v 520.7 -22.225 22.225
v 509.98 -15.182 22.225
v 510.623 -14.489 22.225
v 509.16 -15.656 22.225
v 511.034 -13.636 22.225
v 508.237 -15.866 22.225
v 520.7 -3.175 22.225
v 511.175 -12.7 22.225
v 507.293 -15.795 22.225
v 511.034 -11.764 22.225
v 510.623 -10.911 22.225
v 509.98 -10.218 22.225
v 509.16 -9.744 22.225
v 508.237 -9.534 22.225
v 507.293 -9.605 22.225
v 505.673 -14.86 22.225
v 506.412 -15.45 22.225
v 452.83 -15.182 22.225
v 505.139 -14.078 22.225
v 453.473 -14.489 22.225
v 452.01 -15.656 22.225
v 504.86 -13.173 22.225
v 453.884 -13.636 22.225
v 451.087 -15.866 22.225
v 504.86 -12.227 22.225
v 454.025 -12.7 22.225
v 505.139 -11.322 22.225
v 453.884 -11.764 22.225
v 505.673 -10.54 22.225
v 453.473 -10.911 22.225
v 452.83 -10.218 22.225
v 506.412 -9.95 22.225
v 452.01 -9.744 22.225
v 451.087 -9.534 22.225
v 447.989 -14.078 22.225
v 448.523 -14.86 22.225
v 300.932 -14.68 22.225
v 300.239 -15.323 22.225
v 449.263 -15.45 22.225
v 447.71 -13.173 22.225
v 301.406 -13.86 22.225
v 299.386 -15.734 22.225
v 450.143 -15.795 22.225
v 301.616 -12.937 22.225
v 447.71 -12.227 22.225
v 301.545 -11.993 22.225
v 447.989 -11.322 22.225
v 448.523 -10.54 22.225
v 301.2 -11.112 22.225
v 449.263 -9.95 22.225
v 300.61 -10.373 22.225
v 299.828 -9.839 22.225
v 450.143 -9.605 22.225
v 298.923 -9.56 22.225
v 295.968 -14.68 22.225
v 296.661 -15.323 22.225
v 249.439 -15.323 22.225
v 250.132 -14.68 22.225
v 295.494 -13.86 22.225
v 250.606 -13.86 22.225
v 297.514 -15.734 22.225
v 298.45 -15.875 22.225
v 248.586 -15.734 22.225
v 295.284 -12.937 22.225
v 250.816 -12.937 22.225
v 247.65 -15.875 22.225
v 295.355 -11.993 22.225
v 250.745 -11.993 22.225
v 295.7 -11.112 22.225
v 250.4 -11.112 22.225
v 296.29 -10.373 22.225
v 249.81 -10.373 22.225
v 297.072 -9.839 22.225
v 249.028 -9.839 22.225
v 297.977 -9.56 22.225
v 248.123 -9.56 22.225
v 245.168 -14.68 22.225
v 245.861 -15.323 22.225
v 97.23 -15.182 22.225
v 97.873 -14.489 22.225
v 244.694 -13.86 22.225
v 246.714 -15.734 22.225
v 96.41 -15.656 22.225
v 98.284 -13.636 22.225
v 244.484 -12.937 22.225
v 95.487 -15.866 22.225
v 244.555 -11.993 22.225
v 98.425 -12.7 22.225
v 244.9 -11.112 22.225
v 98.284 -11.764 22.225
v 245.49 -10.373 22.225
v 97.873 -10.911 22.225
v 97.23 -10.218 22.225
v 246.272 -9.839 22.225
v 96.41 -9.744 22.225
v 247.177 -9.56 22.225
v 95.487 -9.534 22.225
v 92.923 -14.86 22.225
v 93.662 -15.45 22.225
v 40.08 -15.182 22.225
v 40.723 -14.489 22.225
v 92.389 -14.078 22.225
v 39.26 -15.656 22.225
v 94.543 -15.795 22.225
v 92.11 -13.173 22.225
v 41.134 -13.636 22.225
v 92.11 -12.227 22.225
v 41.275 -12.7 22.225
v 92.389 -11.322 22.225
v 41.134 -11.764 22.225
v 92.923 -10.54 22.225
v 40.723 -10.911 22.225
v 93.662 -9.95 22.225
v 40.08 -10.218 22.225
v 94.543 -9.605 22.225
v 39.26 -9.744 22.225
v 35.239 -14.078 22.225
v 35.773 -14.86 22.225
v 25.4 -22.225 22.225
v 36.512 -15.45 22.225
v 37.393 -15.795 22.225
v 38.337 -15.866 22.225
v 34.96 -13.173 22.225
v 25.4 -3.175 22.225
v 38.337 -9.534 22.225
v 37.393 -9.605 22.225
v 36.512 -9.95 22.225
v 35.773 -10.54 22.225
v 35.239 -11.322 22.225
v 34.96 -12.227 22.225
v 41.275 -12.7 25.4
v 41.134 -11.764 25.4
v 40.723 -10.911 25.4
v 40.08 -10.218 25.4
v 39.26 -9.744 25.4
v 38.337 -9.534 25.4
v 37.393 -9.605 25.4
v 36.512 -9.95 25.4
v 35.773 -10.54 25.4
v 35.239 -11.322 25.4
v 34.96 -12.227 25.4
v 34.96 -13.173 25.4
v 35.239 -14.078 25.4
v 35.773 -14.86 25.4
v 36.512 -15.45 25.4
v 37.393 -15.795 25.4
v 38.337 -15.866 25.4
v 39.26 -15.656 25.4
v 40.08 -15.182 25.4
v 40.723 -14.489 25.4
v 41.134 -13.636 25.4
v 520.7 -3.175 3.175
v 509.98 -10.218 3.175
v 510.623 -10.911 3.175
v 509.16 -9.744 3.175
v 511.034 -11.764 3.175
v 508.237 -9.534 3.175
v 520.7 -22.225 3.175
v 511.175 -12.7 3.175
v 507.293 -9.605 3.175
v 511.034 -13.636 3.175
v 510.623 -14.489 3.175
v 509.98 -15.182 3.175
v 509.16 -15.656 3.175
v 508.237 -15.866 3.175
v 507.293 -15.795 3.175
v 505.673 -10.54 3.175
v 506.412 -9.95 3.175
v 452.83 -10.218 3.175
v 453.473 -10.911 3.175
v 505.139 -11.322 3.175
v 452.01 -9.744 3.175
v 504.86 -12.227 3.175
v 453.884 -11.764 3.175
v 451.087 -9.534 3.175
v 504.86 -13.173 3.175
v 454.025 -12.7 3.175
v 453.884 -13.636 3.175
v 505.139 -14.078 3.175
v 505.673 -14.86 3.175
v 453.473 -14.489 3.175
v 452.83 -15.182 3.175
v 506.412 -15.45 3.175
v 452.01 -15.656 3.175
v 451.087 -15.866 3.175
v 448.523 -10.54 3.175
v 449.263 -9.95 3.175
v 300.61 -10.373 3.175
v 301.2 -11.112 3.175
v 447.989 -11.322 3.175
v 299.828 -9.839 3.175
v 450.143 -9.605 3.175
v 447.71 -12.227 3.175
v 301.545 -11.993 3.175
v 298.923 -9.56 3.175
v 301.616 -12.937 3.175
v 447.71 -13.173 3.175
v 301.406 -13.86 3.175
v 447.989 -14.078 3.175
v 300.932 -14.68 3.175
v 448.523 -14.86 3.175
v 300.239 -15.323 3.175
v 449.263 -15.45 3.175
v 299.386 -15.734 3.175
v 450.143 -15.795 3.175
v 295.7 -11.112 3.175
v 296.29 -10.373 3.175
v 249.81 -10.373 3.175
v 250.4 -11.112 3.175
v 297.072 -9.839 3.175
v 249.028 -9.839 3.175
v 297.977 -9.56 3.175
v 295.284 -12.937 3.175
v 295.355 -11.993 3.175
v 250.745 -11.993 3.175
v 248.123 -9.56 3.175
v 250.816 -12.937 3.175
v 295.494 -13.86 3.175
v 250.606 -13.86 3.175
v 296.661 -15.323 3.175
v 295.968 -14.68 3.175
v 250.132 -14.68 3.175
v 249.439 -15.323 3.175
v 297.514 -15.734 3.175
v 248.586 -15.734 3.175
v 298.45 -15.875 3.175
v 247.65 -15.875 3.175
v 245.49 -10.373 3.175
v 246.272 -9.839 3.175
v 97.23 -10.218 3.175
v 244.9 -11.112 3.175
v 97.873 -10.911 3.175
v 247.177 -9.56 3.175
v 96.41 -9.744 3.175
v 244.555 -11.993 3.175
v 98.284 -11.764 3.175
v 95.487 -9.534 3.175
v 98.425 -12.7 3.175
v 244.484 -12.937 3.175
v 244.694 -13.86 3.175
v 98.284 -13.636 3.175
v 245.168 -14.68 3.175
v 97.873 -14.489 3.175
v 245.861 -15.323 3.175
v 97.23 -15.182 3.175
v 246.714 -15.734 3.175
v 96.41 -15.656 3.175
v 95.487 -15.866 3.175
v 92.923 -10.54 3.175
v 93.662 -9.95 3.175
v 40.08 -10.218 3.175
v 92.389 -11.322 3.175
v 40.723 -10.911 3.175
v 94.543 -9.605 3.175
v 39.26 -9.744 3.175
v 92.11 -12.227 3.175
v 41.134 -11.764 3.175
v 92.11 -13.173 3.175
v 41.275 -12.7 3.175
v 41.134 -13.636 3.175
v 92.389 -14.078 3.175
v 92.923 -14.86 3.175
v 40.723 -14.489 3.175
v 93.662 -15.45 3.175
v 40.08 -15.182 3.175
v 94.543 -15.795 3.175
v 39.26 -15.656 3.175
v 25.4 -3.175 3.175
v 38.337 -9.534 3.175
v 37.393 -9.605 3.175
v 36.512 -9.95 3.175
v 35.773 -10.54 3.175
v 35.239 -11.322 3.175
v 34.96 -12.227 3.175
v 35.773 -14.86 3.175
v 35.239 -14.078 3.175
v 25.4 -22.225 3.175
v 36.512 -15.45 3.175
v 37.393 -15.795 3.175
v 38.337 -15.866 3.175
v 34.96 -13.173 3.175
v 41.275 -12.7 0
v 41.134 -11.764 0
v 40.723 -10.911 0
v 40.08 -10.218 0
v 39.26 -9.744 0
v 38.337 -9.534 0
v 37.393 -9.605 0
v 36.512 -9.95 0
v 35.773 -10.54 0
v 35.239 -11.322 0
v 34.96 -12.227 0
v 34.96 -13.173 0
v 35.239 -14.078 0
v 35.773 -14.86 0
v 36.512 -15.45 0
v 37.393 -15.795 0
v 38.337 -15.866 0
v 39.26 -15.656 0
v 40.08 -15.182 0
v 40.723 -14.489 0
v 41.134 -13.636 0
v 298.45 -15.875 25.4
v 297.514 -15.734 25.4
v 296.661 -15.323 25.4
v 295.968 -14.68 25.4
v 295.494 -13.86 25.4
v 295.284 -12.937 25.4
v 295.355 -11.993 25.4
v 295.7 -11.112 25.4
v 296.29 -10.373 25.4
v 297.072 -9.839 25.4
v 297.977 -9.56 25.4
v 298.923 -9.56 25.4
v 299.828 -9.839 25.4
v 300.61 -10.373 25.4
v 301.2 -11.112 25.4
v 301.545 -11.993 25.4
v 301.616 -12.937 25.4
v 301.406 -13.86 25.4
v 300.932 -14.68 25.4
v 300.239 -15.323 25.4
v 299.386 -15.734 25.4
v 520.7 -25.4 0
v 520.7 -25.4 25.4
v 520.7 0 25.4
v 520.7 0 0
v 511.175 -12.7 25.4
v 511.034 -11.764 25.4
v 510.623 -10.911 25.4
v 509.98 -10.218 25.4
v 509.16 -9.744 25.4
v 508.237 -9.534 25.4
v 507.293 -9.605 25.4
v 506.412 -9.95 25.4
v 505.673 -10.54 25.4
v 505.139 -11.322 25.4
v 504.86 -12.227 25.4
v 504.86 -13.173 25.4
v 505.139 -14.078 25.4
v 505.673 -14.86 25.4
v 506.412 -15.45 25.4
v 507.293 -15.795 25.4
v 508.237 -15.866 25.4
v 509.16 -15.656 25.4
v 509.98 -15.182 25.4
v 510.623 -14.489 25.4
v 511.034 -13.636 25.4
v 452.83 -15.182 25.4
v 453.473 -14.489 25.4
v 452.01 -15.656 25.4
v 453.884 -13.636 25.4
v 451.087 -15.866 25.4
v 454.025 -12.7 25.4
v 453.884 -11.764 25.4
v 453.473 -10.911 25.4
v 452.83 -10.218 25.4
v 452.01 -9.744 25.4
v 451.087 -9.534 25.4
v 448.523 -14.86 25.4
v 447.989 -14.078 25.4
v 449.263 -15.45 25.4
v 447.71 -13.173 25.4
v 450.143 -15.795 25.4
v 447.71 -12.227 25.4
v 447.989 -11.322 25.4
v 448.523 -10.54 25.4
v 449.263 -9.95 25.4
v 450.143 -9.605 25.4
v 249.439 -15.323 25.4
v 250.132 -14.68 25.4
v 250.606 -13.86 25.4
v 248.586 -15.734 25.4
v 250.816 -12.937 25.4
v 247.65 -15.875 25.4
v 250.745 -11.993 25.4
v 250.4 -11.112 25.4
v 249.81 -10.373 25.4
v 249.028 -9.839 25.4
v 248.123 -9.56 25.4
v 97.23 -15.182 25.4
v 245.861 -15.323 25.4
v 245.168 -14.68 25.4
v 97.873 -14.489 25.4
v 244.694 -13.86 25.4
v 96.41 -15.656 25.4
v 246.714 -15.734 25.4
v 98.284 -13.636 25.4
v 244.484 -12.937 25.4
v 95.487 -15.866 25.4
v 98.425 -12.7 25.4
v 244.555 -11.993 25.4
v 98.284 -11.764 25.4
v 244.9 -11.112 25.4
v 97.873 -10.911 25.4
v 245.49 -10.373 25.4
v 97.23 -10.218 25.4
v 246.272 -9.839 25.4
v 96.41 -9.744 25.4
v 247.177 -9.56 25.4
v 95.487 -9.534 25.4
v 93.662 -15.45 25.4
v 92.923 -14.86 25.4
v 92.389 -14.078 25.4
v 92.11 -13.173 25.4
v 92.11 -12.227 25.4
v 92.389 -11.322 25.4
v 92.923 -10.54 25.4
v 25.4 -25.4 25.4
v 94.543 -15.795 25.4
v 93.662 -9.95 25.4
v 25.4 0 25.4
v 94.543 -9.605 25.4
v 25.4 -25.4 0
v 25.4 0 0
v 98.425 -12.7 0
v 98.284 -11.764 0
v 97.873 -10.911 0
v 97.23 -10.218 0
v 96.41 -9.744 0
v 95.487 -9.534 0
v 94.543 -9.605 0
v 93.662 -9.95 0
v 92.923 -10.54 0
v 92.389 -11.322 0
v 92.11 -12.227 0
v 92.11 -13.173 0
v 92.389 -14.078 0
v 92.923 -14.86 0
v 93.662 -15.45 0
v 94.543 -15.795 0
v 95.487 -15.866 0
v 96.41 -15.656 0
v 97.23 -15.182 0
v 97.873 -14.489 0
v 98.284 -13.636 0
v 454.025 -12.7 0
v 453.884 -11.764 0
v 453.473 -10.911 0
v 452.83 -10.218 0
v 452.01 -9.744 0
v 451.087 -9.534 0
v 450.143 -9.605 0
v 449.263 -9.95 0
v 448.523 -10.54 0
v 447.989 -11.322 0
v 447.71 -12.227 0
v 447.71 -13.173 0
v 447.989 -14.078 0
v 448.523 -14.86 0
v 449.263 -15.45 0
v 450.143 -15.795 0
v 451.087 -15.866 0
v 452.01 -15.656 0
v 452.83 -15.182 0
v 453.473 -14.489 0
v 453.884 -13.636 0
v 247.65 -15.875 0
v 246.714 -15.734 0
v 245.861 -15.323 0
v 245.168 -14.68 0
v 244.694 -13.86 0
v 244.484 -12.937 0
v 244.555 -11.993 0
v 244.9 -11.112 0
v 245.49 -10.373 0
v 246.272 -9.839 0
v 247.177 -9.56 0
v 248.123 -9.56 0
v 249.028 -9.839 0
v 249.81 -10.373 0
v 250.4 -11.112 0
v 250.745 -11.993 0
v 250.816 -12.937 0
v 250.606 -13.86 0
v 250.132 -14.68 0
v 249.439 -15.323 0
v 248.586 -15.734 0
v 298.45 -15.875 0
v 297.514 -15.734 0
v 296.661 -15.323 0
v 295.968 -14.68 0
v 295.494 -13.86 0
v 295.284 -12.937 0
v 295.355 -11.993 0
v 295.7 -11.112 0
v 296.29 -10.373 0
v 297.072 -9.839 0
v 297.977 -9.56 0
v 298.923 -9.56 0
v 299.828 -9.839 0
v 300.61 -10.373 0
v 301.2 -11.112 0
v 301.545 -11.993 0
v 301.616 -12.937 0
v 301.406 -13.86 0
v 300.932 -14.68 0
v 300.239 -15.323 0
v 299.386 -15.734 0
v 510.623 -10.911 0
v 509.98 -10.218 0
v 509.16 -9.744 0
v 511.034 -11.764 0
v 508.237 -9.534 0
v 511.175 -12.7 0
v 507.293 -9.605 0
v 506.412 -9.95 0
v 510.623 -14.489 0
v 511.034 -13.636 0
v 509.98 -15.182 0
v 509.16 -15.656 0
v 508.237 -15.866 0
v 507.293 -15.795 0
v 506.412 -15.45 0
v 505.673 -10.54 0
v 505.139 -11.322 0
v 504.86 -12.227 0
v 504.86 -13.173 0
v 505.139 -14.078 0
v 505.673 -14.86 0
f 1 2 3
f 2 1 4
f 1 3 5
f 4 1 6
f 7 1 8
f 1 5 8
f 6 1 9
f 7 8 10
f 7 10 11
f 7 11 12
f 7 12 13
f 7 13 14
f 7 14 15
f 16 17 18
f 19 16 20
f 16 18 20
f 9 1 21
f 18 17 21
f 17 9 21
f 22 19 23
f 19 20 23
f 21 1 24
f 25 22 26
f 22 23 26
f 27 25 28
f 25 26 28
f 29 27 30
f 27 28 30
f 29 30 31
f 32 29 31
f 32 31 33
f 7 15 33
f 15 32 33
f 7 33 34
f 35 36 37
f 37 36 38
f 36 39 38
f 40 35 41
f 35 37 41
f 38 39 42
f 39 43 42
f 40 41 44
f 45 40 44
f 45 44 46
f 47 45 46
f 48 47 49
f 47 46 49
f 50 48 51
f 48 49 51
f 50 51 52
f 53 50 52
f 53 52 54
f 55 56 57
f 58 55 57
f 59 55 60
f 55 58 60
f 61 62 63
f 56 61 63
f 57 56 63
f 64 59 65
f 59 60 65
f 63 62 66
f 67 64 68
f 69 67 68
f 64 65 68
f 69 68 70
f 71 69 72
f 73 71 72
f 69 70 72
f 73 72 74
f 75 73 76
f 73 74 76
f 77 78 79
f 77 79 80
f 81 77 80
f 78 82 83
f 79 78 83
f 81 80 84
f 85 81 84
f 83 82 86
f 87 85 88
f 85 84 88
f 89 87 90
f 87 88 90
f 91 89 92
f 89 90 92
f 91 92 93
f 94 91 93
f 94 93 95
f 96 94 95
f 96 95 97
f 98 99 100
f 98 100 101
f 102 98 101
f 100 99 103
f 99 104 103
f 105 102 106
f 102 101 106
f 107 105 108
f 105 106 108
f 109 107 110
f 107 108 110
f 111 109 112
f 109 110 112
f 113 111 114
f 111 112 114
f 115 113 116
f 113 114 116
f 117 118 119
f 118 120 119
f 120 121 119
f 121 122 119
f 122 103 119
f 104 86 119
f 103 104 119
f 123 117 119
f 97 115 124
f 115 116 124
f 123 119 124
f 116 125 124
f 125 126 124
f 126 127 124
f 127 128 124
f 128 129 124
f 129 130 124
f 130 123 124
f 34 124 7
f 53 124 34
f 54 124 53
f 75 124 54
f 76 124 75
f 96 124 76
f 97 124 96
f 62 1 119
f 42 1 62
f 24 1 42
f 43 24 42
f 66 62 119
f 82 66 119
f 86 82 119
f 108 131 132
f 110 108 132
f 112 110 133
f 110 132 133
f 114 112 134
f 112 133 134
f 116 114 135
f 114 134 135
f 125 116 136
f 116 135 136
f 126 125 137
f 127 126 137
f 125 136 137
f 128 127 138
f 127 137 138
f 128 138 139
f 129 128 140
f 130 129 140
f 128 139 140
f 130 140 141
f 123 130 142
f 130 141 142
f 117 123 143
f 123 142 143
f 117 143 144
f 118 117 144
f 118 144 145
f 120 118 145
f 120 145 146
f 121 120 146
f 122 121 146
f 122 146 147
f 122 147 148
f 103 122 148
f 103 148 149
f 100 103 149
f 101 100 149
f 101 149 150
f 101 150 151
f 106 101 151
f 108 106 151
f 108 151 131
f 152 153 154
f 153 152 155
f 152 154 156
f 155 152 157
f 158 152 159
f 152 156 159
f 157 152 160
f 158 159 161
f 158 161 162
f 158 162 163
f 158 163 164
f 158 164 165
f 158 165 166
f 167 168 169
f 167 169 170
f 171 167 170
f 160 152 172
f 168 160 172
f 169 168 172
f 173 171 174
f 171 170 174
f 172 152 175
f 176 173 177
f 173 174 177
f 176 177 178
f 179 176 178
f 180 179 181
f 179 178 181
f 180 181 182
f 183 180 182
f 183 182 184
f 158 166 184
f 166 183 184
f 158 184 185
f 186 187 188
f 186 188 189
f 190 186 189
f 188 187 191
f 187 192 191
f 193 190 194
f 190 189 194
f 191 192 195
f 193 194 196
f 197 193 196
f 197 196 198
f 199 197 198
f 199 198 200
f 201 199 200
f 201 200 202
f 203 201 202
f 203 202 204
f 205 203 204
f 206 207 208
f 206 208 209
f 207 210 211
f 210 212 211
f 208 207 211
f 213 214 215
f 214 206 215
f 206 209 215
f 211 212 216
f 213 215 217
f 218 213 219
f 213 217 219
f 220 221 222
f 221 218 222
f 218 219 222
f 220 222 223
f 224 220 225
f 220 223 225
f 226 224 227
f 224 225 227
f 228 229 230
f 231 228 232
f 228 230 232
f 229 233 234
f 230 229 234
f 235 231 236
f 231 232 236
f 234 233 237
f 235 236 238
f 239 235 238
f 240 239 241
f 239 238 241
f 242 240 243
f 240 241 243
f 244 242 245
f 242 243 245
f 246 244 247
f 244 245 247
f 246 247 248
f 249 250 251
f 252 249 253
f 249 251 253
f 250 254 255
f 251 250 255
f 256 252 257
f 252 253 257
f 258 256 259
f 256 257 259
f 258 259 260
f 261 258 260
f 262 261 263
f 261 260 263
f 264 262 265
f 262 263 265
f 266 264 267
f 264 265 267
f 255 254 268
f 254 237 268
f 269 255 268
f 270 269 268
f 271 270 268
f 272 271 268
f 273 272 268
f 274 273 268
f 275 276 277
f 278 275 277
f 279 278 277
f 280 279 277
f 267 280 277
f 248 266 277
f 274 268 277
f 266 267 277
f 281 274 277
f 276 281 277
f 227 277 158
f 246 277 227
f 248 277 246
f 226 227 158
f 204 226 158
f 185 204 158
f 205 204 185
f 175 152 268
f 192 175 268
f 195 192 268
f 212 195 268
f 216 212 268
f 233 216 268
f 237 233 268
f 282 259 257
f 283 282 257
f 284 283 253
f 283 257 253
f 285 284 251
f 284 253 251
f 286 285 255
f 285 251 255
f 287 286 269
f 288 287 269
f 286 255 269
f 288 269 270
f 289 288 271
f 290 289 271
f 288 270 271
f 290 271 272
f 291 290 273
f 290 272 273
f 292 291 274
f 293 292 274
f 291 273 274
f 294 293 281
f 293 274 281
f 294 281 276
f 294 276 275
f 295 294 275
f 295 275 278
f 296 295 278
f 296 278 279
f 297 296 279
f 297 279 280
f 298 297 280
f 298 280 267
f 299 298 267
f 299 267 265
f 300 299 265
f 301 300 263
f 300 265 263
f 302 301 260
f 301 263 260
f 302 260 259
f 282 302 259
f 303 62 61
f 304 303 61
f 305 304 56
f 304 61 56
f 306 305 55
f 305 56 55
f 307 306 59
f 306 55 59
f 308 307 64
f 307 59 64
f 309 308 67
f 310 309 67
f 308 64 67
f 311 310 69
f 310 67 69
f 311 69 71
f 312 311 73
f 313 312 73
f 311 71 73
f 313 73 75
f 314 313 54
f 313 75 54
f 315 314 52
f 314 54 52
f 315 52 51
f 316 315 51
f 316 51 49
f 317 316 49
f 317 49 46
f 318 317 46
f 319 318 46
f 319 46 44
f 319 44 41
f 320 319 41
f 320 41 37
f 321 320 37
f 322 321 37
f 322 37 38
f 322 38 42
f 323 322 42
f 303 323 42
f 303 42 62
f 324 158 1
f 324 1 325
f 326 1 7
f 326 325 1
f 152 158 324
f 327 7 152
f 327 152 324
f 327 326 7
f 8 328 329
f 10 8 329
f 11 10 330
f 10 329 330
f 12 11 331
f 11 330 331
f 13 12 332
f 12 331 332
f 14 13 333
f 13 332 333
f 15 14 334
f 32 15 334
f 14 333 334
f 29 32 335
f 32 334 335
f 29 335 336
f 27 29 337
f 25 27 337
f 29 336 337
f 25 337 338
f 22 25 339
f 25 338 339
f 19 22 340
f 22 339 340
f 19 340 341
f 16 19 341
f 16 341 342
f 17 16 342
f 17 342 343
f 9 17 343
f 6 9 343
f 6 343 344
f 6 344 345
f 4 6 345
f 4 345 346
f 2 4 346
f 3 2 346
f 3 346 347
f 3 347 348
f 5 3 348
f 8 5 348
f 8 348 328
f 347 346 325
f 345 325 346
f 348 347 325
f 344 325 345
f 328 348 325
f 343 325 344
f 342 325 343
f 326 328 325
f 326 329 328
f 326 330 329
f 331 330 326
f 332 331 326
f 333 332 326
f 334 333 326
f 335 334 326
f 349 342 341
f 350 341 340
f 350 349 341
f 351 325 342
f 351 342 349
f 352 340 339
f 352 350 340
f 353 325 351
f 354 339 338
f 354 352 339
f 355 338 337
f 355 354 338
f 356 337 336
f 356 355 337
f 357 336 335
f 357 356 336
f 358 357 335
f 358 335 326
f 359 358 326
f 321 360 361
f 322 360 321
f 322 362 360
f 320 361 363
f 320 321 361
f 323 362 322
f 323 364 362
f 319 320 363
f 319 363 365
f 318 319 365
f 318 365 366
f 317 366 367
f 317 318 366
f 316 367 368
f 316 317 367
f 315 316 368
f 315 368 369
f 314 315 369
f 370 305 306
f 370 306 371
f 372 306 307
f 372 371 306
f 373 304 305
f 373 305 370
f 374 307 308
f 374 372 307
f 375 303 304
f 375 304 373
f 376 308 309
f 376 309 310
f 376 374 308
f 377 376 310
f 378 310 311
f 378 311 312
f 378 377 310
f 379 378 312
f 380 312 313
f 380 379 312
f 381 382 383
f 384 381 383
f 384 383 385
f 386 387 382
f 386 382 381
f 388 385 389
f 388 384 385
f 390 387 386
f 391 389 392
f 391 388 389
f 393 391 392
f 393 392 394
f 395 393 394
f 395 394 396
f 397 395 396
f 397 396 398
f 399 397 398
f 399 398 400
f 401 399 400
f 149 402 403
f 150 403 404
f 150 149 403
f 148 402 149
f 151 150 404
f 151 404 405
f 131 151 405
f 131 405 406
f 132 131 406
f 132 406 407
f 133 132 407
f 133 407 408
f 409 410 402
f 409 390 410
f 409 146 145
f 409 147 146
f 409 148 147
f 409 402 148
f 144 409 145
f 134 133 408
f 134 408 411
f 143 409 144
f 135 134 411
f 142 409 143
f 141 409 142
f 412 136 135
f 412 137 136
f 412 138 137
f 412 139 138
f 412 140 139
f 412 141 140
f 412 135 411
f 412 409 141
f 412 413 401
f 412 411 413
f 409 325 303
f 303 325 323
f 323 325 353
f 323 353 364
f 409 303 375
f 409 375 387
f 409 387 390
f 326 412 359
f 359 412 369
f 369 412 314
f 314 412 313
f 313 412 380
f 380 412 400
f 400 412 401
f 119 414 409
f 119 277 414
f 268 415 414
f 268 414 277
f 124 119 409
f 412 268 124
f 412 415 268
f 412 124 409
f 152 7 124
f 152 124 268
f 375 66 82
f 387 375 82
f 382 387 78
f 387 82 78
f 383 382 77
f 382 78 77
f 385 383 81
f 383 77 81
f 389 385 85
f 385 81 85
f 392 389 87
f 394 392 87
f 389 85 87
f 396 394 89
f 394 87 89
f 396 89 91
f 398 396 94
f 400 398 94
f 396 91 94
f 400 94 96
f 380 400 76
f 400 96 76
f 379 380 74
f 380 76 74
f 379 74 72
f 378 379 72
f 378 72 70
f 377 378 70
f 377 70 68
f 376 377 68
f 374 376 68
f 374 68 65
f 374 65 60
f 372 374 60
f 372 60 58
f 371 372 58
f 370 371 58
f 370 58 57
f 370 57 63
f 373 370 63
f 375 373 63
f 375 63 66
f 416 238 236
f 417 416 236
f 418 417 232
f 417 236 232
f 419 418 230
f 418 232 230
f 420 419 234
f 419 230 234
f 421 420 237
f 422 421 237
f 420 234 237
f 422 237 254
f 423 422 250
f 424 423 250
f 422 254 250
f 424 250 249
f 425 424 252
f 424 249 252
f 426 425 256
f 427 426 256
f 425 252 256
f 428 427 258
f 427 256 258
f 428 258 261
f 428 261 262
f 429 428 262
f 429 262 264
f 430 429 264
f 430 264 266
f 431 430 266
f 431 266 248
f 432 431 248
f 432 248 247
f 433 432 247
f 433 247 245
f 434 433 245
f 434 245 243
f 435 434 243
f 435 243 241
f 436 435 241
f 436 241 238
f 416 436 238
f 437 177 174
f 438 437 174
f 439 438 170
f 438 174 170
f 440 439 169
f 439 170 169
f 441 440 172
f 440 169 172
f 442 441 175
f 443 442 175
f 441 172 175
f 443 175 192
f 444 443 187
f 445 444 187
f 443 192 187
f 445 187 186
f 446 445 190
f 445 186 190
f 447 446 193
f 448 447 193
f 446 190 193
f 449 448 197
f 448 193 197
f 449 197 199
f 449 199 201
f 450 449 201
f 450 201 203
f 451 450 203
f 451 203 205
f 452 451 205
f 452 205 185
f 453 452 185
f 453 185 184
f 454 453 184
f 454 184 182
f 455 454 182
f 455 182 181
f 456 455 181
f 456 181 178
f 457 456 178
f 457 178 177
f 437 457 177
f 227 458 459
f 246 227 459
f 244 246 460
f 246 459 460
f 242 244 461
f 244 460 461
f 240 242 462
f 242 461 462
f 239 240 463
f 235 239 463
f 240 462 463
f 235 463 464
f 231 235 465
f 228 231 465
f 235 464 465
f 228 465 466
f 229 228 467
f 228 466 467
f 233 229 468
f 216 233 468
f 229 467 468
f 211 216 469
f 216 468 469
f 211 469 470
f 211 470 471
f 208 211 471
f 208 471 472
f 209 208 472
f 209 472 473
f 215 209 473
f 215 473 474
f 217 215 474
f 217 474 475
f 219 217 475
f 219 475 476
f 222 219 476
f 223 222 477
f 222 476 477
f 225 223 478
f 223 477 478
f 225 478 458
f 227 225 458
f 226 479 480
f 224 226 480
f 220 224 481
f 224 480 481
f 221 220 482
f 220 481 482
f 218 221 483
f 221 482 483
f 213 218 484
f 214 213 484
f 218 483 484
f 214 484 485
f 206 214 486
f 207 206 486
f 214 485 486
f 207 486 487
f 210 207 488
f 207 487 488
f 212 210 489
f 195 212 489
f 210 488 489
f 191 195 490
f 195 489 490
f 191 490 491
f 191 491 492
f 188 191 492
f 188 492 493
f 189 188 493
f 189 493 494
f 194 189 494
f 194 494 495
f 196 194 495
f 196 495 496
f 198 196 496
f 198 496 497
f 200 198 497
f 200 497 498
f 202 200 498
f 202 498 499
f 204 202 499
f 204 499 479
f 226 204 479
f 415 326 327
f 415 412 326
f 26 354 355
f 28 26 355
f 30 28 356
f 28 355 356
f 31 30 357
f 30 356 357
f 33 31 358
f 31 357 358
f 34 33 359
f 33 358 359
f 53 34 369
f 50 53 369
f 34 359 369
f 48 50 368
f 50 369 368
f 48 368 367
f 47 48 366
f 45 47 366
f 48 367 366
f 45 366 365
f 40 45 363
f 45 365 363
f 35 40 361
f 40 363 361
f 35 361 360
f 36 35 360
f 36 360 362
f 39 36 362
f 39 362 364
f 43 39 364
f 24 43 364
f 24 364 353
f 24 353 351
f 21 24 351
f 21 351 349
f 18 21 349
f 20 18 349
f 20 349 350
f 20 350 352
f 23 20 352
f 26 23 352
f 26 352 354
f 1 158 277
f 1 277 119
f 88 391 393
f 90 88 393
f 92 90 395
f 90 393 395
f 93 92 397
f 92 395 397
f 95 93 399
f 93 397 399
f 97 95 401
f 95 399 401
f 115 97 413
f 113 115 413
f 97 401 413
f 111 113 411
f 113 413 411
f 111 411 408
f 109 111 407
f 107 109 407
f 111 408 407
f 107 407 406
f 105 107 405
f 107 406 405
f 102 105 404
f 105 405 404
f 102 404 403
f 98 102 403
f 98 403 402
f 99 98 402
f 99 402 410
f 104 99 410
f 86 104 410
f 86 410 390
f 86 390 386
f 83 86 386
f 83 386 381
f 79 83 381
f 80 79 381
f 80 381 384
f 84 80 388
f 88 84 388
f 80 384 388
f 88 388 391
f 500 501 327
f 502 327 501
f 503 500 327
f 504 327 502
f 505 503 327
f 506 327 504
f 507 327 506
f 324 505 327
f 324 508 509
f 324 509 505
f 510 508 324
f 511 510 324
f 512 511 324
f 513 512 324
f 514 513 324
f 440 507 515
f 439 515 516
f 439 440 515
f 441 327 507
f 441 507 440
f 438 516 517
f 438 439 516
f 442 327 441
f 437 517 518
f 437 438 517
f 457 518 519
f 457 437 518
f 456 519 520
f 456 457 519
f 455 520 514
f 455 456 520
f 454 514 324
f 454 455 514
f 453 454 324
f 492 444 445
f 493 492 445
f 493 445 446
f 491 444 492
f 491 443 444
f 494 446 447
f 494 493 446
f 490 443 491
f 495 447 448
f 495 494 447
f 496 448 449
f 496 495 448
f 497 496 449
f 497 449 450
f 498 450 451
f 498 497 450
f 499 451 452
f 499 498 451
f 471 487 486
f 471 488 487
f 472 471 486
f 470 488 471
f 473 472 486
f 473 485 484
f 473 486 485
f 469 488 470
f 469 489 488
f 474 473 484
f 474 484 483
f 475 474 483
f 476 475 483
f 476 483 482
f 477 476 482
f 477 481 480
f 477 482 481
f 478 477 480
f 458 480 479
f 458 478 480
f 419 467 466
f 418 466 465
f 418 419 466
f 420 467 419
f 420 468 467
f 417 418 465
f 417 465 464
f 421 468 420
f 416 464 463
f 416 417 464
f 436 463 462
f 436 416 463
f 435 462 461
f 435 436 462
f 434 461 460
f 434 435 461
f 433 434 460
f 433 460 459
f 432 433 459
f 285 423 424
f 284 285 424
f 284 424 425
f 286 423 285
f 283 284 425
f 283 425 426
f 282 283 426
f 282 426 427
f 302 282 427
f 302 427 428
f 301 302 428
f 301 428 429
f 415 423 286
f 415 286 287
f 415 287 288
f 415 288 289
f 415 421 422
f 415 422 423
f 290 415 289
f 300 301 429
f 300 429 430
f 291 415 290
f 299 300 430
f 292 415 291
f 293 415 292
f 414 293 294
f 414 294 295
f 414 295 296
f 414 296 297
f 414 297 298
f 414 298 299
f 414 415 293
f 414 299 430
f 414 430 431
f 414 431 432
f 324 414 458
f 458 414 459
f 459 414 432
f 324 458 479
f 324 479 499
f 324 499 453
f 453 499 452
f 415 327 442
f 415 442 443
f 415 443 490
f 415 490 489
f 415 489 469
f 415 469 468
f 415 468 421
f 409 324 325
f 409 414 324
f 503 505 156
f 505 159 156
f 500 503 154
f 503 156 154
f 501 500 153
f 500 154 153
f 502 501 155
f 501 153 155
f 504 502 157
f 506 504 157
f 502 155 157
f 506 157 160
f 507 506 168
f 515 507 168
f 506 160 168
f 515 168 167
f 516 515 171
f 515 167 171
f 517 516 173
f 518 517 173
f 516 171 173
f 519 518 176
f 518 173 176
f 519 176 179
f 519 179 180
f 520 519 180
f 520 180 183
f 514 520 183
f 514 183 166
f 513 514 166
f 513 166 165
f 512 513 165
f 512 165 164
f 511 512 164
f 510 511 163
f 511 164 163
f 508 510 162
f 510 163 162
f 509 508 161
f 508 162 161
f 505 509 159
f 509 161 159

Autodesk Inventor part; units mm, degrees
ref_plane "YZ Plane" through (0, 0, 0) normal (1, 0, 0) x (0, 1, 0)
ref_plane "XZ Plane" through (0, 0, 0) normal (0, 1, 0) x (-1, 0, 0)
ref_plane "XY Plane" through (0, 0, 0) normal (0, 0, 1) x (1, 0, 0)
sketch "Sketch1" plane through (0, 0, 0) normal (1, 0, 0) x (0, 1, 0)
  line L0 (0, 0) -> (-25.4, 0)
  line L1 (-25.4, 0) -> (-25.4, 25.4)
  line L2 (-25.4, 25.4) -> (0, 25.4)
  line L3 (0, 25.4) -> (0, 0)
  line L4 (-3.175, 3.175) -> (-22.225, 3.175)
  line L5 (-22.225, 3.175) -> (-22.225, 22.225)
  line L6 (-22.225, 22.225) -> (-3.175, 22.225)
  line L7 (-3.175, 22.225) -> (-3.175, 3.175)
  dimension "d0" = 25.4
  dimension "d1" = 25.4
  dimension "d2" = 19.05
  dimension "d3" = 19.05
  dimension "d4" = 3.175
  dimension "d5" = 3.175
extrude "Extrusion1" add sketch "Sketch1" along normal blind 546.1
sketch "Sketch2" plane through (0, -25.4, 25.4) normal (0, 0, 1) x (1, 0, 0)
  line L0 (0, 0) -> (0, 25.4) projected
  line L1 (0, 0) -> (546.1, 0) projected
  line L2 (546.1, 25.4) -> (546.1, 0) projected
  line L3 (0, 25.4) -> (546.1, 25.4) projected
  point P0 (12.7, 12.7)
  point P1 (533.4, 12.7)
  dimension "d8" = 12.7
  dimension "d9" = 12.7
  dimension "d10" = 12.7
  dimension "d11" = 12.7
hole "Hole1" at (12.7, -12.7, 25.4) at (533.4, -12.7, 25.4) direction (0, 0, -1) diameter 6.35 end through all
sketch "Sketch3" plane through (0, -25.4, 25.4) normal (0, 0, 1) x (1, 0, 0)
  circle A0 centre (12.7, 12.7) radius 3.175 projected
  circle A1 centre (533.4, 12.7) radius 3.175 projected
  line L0 (0, 0) -> (0, 25.4) projected
  line L1 (0, 0) -> (546.1, 0) projected
  line L2 (546.1, 25.4) -> (546.1, 0) projected
  line L3 (0, 25.4) -> (546.1, 25.4) projected
  point P0 (247.65, 12.7)
  point P1 (298.45, 12.7)
  dimension "d19" = 247.65
  dimension "d20" = 247.65
  dimension "d21" = 12.7
  dimension "d22" = 12.7
hole "Hole2" at (247.65, -12.7, 25.4) at (298.45, -12.7, 25.4) direction (0, 0, -1) diameter 6.35 end through all
sketch "Sketch4" plane through (0, -25.4, 25.4) normal (0, 0, 1) x (1, 0, 0)
  circle A0 centre (247.65, 12.7) radius 3.175 projected
  circle A1 centre (298.45, 12.7) radius 3.175 projected
  circle A2 centre (12.7, 12.7) radius 3.175 projected
  circle A3 centre (533.4, 12.7) radius 3.175 projected
  line L0 (0, 0) -> (0, 25.4) projected
  line L1 (0, 0) -> (546.1, 0) projected
  line L2 (546.1, 25.4) -> (546.1, 0) projected
  line L3 (0, 25.4) -> (546.1, 25.4) projected
  point P0 (38.1, 12.7)
  point P1 (508, 12.7)
  dimension "d30" = 38.1
  dimension "d31" = 12.7
  dimension "d32" = 12.7
  dimension "d33" = 38.1
hole "Hole3" at (38.1, -12.7, 25.4) at (508, -12.7, 25.4) direction (0, 0, -1) diameter 4.7625 end through all
sketch "Sketch7" plane through (0, -25.4, 25.4) normal (0, 0, 1) x (1, 0, 0)
  circle A0 centre (38.1, 12.7) radius 2.3813 projected
  circle A1 centre (508, 12.7) radius 2.3813 projected
  line L0 (0, 0) -> (546.1, 0) projected
  circle A2 centre (38.1, 12.7) radius 3.175
  circle A3 centre (95.25, 12.7) radius 3.175
  circle A4 centre (508, 12.7) radius 2.3813 projected
  circle A5 centre (508, 12.7) radius 3.175
  circle A6 centre (450.85, 12.7) radius 3.175
  dimension "d65" = 6.35
  dimension "d66" = 6.35
  dimension "d67" = 12.7
  dimension "d68" = 57.15
  dimension "d69" = 6.35
  dimension "d70" = 6.35
  dimension "d71" = 12.7
  dimension "d72" = 57.15
extrude "Extrusion2" cut sketch "Sketch7" against normal blind 25.4
sketch "Sketch8" plane through (0, 0, 0) normal (-1, 0, 0) x (0, 0, 1)
  line L0 (22.225, -22.225) -> (3.175, -22.225) projected
  line L1 (3.175, -22.225) -> (3.175, -3.175) projected
  line L2 (3.175, -3.175) -> (22.225, -3.175) projected
  line L3 (22.225, -3.175) -> (22.225, -22.225) projected
  line L4 (0, 0) -> (0, -25.4) projected
  line L5 (0, -25.4) -> (25.4, -25.4) projected
  line L6 (25.4, -25.4) -> (25.4, 0) projected
  line L7 (25.4, 0) -> (0, 0) projected
extrude "Extrusion3" cut sketch "Sketch8" against normal blind 25.4
sketch "Sketch9" plane through (546.1, 0, 0) normal (1, 0, 0) x (0, 0, -1)
  line L0 (-3.175, -22.225) -> (-22.225, -22.225) projected
  line L1 (-22.225, -22.225) -> (-22.225, -3.175) projected
  line L2 (-22.225, -3.175) -> (-3.175, -3.175) projected
  line L3 (-3.175, -3.175) -> (-3.175, -22.225) projected
  line L4 (0, -25.4) -> (0, 0) projected
  line L5 (0, 0) -> (-25.4, 0) projected
  line L6 (-25.4, 0) -> (-25.4, -25.4) projected
  line L7 (-25.4, -25.4) -> (0, -25.4) projected
extrude "Extrusion4" cut sketch "Sketch9" against normal blind 25.4
properties part number "1x1 horizontal support" material "Aluminum 6061"
